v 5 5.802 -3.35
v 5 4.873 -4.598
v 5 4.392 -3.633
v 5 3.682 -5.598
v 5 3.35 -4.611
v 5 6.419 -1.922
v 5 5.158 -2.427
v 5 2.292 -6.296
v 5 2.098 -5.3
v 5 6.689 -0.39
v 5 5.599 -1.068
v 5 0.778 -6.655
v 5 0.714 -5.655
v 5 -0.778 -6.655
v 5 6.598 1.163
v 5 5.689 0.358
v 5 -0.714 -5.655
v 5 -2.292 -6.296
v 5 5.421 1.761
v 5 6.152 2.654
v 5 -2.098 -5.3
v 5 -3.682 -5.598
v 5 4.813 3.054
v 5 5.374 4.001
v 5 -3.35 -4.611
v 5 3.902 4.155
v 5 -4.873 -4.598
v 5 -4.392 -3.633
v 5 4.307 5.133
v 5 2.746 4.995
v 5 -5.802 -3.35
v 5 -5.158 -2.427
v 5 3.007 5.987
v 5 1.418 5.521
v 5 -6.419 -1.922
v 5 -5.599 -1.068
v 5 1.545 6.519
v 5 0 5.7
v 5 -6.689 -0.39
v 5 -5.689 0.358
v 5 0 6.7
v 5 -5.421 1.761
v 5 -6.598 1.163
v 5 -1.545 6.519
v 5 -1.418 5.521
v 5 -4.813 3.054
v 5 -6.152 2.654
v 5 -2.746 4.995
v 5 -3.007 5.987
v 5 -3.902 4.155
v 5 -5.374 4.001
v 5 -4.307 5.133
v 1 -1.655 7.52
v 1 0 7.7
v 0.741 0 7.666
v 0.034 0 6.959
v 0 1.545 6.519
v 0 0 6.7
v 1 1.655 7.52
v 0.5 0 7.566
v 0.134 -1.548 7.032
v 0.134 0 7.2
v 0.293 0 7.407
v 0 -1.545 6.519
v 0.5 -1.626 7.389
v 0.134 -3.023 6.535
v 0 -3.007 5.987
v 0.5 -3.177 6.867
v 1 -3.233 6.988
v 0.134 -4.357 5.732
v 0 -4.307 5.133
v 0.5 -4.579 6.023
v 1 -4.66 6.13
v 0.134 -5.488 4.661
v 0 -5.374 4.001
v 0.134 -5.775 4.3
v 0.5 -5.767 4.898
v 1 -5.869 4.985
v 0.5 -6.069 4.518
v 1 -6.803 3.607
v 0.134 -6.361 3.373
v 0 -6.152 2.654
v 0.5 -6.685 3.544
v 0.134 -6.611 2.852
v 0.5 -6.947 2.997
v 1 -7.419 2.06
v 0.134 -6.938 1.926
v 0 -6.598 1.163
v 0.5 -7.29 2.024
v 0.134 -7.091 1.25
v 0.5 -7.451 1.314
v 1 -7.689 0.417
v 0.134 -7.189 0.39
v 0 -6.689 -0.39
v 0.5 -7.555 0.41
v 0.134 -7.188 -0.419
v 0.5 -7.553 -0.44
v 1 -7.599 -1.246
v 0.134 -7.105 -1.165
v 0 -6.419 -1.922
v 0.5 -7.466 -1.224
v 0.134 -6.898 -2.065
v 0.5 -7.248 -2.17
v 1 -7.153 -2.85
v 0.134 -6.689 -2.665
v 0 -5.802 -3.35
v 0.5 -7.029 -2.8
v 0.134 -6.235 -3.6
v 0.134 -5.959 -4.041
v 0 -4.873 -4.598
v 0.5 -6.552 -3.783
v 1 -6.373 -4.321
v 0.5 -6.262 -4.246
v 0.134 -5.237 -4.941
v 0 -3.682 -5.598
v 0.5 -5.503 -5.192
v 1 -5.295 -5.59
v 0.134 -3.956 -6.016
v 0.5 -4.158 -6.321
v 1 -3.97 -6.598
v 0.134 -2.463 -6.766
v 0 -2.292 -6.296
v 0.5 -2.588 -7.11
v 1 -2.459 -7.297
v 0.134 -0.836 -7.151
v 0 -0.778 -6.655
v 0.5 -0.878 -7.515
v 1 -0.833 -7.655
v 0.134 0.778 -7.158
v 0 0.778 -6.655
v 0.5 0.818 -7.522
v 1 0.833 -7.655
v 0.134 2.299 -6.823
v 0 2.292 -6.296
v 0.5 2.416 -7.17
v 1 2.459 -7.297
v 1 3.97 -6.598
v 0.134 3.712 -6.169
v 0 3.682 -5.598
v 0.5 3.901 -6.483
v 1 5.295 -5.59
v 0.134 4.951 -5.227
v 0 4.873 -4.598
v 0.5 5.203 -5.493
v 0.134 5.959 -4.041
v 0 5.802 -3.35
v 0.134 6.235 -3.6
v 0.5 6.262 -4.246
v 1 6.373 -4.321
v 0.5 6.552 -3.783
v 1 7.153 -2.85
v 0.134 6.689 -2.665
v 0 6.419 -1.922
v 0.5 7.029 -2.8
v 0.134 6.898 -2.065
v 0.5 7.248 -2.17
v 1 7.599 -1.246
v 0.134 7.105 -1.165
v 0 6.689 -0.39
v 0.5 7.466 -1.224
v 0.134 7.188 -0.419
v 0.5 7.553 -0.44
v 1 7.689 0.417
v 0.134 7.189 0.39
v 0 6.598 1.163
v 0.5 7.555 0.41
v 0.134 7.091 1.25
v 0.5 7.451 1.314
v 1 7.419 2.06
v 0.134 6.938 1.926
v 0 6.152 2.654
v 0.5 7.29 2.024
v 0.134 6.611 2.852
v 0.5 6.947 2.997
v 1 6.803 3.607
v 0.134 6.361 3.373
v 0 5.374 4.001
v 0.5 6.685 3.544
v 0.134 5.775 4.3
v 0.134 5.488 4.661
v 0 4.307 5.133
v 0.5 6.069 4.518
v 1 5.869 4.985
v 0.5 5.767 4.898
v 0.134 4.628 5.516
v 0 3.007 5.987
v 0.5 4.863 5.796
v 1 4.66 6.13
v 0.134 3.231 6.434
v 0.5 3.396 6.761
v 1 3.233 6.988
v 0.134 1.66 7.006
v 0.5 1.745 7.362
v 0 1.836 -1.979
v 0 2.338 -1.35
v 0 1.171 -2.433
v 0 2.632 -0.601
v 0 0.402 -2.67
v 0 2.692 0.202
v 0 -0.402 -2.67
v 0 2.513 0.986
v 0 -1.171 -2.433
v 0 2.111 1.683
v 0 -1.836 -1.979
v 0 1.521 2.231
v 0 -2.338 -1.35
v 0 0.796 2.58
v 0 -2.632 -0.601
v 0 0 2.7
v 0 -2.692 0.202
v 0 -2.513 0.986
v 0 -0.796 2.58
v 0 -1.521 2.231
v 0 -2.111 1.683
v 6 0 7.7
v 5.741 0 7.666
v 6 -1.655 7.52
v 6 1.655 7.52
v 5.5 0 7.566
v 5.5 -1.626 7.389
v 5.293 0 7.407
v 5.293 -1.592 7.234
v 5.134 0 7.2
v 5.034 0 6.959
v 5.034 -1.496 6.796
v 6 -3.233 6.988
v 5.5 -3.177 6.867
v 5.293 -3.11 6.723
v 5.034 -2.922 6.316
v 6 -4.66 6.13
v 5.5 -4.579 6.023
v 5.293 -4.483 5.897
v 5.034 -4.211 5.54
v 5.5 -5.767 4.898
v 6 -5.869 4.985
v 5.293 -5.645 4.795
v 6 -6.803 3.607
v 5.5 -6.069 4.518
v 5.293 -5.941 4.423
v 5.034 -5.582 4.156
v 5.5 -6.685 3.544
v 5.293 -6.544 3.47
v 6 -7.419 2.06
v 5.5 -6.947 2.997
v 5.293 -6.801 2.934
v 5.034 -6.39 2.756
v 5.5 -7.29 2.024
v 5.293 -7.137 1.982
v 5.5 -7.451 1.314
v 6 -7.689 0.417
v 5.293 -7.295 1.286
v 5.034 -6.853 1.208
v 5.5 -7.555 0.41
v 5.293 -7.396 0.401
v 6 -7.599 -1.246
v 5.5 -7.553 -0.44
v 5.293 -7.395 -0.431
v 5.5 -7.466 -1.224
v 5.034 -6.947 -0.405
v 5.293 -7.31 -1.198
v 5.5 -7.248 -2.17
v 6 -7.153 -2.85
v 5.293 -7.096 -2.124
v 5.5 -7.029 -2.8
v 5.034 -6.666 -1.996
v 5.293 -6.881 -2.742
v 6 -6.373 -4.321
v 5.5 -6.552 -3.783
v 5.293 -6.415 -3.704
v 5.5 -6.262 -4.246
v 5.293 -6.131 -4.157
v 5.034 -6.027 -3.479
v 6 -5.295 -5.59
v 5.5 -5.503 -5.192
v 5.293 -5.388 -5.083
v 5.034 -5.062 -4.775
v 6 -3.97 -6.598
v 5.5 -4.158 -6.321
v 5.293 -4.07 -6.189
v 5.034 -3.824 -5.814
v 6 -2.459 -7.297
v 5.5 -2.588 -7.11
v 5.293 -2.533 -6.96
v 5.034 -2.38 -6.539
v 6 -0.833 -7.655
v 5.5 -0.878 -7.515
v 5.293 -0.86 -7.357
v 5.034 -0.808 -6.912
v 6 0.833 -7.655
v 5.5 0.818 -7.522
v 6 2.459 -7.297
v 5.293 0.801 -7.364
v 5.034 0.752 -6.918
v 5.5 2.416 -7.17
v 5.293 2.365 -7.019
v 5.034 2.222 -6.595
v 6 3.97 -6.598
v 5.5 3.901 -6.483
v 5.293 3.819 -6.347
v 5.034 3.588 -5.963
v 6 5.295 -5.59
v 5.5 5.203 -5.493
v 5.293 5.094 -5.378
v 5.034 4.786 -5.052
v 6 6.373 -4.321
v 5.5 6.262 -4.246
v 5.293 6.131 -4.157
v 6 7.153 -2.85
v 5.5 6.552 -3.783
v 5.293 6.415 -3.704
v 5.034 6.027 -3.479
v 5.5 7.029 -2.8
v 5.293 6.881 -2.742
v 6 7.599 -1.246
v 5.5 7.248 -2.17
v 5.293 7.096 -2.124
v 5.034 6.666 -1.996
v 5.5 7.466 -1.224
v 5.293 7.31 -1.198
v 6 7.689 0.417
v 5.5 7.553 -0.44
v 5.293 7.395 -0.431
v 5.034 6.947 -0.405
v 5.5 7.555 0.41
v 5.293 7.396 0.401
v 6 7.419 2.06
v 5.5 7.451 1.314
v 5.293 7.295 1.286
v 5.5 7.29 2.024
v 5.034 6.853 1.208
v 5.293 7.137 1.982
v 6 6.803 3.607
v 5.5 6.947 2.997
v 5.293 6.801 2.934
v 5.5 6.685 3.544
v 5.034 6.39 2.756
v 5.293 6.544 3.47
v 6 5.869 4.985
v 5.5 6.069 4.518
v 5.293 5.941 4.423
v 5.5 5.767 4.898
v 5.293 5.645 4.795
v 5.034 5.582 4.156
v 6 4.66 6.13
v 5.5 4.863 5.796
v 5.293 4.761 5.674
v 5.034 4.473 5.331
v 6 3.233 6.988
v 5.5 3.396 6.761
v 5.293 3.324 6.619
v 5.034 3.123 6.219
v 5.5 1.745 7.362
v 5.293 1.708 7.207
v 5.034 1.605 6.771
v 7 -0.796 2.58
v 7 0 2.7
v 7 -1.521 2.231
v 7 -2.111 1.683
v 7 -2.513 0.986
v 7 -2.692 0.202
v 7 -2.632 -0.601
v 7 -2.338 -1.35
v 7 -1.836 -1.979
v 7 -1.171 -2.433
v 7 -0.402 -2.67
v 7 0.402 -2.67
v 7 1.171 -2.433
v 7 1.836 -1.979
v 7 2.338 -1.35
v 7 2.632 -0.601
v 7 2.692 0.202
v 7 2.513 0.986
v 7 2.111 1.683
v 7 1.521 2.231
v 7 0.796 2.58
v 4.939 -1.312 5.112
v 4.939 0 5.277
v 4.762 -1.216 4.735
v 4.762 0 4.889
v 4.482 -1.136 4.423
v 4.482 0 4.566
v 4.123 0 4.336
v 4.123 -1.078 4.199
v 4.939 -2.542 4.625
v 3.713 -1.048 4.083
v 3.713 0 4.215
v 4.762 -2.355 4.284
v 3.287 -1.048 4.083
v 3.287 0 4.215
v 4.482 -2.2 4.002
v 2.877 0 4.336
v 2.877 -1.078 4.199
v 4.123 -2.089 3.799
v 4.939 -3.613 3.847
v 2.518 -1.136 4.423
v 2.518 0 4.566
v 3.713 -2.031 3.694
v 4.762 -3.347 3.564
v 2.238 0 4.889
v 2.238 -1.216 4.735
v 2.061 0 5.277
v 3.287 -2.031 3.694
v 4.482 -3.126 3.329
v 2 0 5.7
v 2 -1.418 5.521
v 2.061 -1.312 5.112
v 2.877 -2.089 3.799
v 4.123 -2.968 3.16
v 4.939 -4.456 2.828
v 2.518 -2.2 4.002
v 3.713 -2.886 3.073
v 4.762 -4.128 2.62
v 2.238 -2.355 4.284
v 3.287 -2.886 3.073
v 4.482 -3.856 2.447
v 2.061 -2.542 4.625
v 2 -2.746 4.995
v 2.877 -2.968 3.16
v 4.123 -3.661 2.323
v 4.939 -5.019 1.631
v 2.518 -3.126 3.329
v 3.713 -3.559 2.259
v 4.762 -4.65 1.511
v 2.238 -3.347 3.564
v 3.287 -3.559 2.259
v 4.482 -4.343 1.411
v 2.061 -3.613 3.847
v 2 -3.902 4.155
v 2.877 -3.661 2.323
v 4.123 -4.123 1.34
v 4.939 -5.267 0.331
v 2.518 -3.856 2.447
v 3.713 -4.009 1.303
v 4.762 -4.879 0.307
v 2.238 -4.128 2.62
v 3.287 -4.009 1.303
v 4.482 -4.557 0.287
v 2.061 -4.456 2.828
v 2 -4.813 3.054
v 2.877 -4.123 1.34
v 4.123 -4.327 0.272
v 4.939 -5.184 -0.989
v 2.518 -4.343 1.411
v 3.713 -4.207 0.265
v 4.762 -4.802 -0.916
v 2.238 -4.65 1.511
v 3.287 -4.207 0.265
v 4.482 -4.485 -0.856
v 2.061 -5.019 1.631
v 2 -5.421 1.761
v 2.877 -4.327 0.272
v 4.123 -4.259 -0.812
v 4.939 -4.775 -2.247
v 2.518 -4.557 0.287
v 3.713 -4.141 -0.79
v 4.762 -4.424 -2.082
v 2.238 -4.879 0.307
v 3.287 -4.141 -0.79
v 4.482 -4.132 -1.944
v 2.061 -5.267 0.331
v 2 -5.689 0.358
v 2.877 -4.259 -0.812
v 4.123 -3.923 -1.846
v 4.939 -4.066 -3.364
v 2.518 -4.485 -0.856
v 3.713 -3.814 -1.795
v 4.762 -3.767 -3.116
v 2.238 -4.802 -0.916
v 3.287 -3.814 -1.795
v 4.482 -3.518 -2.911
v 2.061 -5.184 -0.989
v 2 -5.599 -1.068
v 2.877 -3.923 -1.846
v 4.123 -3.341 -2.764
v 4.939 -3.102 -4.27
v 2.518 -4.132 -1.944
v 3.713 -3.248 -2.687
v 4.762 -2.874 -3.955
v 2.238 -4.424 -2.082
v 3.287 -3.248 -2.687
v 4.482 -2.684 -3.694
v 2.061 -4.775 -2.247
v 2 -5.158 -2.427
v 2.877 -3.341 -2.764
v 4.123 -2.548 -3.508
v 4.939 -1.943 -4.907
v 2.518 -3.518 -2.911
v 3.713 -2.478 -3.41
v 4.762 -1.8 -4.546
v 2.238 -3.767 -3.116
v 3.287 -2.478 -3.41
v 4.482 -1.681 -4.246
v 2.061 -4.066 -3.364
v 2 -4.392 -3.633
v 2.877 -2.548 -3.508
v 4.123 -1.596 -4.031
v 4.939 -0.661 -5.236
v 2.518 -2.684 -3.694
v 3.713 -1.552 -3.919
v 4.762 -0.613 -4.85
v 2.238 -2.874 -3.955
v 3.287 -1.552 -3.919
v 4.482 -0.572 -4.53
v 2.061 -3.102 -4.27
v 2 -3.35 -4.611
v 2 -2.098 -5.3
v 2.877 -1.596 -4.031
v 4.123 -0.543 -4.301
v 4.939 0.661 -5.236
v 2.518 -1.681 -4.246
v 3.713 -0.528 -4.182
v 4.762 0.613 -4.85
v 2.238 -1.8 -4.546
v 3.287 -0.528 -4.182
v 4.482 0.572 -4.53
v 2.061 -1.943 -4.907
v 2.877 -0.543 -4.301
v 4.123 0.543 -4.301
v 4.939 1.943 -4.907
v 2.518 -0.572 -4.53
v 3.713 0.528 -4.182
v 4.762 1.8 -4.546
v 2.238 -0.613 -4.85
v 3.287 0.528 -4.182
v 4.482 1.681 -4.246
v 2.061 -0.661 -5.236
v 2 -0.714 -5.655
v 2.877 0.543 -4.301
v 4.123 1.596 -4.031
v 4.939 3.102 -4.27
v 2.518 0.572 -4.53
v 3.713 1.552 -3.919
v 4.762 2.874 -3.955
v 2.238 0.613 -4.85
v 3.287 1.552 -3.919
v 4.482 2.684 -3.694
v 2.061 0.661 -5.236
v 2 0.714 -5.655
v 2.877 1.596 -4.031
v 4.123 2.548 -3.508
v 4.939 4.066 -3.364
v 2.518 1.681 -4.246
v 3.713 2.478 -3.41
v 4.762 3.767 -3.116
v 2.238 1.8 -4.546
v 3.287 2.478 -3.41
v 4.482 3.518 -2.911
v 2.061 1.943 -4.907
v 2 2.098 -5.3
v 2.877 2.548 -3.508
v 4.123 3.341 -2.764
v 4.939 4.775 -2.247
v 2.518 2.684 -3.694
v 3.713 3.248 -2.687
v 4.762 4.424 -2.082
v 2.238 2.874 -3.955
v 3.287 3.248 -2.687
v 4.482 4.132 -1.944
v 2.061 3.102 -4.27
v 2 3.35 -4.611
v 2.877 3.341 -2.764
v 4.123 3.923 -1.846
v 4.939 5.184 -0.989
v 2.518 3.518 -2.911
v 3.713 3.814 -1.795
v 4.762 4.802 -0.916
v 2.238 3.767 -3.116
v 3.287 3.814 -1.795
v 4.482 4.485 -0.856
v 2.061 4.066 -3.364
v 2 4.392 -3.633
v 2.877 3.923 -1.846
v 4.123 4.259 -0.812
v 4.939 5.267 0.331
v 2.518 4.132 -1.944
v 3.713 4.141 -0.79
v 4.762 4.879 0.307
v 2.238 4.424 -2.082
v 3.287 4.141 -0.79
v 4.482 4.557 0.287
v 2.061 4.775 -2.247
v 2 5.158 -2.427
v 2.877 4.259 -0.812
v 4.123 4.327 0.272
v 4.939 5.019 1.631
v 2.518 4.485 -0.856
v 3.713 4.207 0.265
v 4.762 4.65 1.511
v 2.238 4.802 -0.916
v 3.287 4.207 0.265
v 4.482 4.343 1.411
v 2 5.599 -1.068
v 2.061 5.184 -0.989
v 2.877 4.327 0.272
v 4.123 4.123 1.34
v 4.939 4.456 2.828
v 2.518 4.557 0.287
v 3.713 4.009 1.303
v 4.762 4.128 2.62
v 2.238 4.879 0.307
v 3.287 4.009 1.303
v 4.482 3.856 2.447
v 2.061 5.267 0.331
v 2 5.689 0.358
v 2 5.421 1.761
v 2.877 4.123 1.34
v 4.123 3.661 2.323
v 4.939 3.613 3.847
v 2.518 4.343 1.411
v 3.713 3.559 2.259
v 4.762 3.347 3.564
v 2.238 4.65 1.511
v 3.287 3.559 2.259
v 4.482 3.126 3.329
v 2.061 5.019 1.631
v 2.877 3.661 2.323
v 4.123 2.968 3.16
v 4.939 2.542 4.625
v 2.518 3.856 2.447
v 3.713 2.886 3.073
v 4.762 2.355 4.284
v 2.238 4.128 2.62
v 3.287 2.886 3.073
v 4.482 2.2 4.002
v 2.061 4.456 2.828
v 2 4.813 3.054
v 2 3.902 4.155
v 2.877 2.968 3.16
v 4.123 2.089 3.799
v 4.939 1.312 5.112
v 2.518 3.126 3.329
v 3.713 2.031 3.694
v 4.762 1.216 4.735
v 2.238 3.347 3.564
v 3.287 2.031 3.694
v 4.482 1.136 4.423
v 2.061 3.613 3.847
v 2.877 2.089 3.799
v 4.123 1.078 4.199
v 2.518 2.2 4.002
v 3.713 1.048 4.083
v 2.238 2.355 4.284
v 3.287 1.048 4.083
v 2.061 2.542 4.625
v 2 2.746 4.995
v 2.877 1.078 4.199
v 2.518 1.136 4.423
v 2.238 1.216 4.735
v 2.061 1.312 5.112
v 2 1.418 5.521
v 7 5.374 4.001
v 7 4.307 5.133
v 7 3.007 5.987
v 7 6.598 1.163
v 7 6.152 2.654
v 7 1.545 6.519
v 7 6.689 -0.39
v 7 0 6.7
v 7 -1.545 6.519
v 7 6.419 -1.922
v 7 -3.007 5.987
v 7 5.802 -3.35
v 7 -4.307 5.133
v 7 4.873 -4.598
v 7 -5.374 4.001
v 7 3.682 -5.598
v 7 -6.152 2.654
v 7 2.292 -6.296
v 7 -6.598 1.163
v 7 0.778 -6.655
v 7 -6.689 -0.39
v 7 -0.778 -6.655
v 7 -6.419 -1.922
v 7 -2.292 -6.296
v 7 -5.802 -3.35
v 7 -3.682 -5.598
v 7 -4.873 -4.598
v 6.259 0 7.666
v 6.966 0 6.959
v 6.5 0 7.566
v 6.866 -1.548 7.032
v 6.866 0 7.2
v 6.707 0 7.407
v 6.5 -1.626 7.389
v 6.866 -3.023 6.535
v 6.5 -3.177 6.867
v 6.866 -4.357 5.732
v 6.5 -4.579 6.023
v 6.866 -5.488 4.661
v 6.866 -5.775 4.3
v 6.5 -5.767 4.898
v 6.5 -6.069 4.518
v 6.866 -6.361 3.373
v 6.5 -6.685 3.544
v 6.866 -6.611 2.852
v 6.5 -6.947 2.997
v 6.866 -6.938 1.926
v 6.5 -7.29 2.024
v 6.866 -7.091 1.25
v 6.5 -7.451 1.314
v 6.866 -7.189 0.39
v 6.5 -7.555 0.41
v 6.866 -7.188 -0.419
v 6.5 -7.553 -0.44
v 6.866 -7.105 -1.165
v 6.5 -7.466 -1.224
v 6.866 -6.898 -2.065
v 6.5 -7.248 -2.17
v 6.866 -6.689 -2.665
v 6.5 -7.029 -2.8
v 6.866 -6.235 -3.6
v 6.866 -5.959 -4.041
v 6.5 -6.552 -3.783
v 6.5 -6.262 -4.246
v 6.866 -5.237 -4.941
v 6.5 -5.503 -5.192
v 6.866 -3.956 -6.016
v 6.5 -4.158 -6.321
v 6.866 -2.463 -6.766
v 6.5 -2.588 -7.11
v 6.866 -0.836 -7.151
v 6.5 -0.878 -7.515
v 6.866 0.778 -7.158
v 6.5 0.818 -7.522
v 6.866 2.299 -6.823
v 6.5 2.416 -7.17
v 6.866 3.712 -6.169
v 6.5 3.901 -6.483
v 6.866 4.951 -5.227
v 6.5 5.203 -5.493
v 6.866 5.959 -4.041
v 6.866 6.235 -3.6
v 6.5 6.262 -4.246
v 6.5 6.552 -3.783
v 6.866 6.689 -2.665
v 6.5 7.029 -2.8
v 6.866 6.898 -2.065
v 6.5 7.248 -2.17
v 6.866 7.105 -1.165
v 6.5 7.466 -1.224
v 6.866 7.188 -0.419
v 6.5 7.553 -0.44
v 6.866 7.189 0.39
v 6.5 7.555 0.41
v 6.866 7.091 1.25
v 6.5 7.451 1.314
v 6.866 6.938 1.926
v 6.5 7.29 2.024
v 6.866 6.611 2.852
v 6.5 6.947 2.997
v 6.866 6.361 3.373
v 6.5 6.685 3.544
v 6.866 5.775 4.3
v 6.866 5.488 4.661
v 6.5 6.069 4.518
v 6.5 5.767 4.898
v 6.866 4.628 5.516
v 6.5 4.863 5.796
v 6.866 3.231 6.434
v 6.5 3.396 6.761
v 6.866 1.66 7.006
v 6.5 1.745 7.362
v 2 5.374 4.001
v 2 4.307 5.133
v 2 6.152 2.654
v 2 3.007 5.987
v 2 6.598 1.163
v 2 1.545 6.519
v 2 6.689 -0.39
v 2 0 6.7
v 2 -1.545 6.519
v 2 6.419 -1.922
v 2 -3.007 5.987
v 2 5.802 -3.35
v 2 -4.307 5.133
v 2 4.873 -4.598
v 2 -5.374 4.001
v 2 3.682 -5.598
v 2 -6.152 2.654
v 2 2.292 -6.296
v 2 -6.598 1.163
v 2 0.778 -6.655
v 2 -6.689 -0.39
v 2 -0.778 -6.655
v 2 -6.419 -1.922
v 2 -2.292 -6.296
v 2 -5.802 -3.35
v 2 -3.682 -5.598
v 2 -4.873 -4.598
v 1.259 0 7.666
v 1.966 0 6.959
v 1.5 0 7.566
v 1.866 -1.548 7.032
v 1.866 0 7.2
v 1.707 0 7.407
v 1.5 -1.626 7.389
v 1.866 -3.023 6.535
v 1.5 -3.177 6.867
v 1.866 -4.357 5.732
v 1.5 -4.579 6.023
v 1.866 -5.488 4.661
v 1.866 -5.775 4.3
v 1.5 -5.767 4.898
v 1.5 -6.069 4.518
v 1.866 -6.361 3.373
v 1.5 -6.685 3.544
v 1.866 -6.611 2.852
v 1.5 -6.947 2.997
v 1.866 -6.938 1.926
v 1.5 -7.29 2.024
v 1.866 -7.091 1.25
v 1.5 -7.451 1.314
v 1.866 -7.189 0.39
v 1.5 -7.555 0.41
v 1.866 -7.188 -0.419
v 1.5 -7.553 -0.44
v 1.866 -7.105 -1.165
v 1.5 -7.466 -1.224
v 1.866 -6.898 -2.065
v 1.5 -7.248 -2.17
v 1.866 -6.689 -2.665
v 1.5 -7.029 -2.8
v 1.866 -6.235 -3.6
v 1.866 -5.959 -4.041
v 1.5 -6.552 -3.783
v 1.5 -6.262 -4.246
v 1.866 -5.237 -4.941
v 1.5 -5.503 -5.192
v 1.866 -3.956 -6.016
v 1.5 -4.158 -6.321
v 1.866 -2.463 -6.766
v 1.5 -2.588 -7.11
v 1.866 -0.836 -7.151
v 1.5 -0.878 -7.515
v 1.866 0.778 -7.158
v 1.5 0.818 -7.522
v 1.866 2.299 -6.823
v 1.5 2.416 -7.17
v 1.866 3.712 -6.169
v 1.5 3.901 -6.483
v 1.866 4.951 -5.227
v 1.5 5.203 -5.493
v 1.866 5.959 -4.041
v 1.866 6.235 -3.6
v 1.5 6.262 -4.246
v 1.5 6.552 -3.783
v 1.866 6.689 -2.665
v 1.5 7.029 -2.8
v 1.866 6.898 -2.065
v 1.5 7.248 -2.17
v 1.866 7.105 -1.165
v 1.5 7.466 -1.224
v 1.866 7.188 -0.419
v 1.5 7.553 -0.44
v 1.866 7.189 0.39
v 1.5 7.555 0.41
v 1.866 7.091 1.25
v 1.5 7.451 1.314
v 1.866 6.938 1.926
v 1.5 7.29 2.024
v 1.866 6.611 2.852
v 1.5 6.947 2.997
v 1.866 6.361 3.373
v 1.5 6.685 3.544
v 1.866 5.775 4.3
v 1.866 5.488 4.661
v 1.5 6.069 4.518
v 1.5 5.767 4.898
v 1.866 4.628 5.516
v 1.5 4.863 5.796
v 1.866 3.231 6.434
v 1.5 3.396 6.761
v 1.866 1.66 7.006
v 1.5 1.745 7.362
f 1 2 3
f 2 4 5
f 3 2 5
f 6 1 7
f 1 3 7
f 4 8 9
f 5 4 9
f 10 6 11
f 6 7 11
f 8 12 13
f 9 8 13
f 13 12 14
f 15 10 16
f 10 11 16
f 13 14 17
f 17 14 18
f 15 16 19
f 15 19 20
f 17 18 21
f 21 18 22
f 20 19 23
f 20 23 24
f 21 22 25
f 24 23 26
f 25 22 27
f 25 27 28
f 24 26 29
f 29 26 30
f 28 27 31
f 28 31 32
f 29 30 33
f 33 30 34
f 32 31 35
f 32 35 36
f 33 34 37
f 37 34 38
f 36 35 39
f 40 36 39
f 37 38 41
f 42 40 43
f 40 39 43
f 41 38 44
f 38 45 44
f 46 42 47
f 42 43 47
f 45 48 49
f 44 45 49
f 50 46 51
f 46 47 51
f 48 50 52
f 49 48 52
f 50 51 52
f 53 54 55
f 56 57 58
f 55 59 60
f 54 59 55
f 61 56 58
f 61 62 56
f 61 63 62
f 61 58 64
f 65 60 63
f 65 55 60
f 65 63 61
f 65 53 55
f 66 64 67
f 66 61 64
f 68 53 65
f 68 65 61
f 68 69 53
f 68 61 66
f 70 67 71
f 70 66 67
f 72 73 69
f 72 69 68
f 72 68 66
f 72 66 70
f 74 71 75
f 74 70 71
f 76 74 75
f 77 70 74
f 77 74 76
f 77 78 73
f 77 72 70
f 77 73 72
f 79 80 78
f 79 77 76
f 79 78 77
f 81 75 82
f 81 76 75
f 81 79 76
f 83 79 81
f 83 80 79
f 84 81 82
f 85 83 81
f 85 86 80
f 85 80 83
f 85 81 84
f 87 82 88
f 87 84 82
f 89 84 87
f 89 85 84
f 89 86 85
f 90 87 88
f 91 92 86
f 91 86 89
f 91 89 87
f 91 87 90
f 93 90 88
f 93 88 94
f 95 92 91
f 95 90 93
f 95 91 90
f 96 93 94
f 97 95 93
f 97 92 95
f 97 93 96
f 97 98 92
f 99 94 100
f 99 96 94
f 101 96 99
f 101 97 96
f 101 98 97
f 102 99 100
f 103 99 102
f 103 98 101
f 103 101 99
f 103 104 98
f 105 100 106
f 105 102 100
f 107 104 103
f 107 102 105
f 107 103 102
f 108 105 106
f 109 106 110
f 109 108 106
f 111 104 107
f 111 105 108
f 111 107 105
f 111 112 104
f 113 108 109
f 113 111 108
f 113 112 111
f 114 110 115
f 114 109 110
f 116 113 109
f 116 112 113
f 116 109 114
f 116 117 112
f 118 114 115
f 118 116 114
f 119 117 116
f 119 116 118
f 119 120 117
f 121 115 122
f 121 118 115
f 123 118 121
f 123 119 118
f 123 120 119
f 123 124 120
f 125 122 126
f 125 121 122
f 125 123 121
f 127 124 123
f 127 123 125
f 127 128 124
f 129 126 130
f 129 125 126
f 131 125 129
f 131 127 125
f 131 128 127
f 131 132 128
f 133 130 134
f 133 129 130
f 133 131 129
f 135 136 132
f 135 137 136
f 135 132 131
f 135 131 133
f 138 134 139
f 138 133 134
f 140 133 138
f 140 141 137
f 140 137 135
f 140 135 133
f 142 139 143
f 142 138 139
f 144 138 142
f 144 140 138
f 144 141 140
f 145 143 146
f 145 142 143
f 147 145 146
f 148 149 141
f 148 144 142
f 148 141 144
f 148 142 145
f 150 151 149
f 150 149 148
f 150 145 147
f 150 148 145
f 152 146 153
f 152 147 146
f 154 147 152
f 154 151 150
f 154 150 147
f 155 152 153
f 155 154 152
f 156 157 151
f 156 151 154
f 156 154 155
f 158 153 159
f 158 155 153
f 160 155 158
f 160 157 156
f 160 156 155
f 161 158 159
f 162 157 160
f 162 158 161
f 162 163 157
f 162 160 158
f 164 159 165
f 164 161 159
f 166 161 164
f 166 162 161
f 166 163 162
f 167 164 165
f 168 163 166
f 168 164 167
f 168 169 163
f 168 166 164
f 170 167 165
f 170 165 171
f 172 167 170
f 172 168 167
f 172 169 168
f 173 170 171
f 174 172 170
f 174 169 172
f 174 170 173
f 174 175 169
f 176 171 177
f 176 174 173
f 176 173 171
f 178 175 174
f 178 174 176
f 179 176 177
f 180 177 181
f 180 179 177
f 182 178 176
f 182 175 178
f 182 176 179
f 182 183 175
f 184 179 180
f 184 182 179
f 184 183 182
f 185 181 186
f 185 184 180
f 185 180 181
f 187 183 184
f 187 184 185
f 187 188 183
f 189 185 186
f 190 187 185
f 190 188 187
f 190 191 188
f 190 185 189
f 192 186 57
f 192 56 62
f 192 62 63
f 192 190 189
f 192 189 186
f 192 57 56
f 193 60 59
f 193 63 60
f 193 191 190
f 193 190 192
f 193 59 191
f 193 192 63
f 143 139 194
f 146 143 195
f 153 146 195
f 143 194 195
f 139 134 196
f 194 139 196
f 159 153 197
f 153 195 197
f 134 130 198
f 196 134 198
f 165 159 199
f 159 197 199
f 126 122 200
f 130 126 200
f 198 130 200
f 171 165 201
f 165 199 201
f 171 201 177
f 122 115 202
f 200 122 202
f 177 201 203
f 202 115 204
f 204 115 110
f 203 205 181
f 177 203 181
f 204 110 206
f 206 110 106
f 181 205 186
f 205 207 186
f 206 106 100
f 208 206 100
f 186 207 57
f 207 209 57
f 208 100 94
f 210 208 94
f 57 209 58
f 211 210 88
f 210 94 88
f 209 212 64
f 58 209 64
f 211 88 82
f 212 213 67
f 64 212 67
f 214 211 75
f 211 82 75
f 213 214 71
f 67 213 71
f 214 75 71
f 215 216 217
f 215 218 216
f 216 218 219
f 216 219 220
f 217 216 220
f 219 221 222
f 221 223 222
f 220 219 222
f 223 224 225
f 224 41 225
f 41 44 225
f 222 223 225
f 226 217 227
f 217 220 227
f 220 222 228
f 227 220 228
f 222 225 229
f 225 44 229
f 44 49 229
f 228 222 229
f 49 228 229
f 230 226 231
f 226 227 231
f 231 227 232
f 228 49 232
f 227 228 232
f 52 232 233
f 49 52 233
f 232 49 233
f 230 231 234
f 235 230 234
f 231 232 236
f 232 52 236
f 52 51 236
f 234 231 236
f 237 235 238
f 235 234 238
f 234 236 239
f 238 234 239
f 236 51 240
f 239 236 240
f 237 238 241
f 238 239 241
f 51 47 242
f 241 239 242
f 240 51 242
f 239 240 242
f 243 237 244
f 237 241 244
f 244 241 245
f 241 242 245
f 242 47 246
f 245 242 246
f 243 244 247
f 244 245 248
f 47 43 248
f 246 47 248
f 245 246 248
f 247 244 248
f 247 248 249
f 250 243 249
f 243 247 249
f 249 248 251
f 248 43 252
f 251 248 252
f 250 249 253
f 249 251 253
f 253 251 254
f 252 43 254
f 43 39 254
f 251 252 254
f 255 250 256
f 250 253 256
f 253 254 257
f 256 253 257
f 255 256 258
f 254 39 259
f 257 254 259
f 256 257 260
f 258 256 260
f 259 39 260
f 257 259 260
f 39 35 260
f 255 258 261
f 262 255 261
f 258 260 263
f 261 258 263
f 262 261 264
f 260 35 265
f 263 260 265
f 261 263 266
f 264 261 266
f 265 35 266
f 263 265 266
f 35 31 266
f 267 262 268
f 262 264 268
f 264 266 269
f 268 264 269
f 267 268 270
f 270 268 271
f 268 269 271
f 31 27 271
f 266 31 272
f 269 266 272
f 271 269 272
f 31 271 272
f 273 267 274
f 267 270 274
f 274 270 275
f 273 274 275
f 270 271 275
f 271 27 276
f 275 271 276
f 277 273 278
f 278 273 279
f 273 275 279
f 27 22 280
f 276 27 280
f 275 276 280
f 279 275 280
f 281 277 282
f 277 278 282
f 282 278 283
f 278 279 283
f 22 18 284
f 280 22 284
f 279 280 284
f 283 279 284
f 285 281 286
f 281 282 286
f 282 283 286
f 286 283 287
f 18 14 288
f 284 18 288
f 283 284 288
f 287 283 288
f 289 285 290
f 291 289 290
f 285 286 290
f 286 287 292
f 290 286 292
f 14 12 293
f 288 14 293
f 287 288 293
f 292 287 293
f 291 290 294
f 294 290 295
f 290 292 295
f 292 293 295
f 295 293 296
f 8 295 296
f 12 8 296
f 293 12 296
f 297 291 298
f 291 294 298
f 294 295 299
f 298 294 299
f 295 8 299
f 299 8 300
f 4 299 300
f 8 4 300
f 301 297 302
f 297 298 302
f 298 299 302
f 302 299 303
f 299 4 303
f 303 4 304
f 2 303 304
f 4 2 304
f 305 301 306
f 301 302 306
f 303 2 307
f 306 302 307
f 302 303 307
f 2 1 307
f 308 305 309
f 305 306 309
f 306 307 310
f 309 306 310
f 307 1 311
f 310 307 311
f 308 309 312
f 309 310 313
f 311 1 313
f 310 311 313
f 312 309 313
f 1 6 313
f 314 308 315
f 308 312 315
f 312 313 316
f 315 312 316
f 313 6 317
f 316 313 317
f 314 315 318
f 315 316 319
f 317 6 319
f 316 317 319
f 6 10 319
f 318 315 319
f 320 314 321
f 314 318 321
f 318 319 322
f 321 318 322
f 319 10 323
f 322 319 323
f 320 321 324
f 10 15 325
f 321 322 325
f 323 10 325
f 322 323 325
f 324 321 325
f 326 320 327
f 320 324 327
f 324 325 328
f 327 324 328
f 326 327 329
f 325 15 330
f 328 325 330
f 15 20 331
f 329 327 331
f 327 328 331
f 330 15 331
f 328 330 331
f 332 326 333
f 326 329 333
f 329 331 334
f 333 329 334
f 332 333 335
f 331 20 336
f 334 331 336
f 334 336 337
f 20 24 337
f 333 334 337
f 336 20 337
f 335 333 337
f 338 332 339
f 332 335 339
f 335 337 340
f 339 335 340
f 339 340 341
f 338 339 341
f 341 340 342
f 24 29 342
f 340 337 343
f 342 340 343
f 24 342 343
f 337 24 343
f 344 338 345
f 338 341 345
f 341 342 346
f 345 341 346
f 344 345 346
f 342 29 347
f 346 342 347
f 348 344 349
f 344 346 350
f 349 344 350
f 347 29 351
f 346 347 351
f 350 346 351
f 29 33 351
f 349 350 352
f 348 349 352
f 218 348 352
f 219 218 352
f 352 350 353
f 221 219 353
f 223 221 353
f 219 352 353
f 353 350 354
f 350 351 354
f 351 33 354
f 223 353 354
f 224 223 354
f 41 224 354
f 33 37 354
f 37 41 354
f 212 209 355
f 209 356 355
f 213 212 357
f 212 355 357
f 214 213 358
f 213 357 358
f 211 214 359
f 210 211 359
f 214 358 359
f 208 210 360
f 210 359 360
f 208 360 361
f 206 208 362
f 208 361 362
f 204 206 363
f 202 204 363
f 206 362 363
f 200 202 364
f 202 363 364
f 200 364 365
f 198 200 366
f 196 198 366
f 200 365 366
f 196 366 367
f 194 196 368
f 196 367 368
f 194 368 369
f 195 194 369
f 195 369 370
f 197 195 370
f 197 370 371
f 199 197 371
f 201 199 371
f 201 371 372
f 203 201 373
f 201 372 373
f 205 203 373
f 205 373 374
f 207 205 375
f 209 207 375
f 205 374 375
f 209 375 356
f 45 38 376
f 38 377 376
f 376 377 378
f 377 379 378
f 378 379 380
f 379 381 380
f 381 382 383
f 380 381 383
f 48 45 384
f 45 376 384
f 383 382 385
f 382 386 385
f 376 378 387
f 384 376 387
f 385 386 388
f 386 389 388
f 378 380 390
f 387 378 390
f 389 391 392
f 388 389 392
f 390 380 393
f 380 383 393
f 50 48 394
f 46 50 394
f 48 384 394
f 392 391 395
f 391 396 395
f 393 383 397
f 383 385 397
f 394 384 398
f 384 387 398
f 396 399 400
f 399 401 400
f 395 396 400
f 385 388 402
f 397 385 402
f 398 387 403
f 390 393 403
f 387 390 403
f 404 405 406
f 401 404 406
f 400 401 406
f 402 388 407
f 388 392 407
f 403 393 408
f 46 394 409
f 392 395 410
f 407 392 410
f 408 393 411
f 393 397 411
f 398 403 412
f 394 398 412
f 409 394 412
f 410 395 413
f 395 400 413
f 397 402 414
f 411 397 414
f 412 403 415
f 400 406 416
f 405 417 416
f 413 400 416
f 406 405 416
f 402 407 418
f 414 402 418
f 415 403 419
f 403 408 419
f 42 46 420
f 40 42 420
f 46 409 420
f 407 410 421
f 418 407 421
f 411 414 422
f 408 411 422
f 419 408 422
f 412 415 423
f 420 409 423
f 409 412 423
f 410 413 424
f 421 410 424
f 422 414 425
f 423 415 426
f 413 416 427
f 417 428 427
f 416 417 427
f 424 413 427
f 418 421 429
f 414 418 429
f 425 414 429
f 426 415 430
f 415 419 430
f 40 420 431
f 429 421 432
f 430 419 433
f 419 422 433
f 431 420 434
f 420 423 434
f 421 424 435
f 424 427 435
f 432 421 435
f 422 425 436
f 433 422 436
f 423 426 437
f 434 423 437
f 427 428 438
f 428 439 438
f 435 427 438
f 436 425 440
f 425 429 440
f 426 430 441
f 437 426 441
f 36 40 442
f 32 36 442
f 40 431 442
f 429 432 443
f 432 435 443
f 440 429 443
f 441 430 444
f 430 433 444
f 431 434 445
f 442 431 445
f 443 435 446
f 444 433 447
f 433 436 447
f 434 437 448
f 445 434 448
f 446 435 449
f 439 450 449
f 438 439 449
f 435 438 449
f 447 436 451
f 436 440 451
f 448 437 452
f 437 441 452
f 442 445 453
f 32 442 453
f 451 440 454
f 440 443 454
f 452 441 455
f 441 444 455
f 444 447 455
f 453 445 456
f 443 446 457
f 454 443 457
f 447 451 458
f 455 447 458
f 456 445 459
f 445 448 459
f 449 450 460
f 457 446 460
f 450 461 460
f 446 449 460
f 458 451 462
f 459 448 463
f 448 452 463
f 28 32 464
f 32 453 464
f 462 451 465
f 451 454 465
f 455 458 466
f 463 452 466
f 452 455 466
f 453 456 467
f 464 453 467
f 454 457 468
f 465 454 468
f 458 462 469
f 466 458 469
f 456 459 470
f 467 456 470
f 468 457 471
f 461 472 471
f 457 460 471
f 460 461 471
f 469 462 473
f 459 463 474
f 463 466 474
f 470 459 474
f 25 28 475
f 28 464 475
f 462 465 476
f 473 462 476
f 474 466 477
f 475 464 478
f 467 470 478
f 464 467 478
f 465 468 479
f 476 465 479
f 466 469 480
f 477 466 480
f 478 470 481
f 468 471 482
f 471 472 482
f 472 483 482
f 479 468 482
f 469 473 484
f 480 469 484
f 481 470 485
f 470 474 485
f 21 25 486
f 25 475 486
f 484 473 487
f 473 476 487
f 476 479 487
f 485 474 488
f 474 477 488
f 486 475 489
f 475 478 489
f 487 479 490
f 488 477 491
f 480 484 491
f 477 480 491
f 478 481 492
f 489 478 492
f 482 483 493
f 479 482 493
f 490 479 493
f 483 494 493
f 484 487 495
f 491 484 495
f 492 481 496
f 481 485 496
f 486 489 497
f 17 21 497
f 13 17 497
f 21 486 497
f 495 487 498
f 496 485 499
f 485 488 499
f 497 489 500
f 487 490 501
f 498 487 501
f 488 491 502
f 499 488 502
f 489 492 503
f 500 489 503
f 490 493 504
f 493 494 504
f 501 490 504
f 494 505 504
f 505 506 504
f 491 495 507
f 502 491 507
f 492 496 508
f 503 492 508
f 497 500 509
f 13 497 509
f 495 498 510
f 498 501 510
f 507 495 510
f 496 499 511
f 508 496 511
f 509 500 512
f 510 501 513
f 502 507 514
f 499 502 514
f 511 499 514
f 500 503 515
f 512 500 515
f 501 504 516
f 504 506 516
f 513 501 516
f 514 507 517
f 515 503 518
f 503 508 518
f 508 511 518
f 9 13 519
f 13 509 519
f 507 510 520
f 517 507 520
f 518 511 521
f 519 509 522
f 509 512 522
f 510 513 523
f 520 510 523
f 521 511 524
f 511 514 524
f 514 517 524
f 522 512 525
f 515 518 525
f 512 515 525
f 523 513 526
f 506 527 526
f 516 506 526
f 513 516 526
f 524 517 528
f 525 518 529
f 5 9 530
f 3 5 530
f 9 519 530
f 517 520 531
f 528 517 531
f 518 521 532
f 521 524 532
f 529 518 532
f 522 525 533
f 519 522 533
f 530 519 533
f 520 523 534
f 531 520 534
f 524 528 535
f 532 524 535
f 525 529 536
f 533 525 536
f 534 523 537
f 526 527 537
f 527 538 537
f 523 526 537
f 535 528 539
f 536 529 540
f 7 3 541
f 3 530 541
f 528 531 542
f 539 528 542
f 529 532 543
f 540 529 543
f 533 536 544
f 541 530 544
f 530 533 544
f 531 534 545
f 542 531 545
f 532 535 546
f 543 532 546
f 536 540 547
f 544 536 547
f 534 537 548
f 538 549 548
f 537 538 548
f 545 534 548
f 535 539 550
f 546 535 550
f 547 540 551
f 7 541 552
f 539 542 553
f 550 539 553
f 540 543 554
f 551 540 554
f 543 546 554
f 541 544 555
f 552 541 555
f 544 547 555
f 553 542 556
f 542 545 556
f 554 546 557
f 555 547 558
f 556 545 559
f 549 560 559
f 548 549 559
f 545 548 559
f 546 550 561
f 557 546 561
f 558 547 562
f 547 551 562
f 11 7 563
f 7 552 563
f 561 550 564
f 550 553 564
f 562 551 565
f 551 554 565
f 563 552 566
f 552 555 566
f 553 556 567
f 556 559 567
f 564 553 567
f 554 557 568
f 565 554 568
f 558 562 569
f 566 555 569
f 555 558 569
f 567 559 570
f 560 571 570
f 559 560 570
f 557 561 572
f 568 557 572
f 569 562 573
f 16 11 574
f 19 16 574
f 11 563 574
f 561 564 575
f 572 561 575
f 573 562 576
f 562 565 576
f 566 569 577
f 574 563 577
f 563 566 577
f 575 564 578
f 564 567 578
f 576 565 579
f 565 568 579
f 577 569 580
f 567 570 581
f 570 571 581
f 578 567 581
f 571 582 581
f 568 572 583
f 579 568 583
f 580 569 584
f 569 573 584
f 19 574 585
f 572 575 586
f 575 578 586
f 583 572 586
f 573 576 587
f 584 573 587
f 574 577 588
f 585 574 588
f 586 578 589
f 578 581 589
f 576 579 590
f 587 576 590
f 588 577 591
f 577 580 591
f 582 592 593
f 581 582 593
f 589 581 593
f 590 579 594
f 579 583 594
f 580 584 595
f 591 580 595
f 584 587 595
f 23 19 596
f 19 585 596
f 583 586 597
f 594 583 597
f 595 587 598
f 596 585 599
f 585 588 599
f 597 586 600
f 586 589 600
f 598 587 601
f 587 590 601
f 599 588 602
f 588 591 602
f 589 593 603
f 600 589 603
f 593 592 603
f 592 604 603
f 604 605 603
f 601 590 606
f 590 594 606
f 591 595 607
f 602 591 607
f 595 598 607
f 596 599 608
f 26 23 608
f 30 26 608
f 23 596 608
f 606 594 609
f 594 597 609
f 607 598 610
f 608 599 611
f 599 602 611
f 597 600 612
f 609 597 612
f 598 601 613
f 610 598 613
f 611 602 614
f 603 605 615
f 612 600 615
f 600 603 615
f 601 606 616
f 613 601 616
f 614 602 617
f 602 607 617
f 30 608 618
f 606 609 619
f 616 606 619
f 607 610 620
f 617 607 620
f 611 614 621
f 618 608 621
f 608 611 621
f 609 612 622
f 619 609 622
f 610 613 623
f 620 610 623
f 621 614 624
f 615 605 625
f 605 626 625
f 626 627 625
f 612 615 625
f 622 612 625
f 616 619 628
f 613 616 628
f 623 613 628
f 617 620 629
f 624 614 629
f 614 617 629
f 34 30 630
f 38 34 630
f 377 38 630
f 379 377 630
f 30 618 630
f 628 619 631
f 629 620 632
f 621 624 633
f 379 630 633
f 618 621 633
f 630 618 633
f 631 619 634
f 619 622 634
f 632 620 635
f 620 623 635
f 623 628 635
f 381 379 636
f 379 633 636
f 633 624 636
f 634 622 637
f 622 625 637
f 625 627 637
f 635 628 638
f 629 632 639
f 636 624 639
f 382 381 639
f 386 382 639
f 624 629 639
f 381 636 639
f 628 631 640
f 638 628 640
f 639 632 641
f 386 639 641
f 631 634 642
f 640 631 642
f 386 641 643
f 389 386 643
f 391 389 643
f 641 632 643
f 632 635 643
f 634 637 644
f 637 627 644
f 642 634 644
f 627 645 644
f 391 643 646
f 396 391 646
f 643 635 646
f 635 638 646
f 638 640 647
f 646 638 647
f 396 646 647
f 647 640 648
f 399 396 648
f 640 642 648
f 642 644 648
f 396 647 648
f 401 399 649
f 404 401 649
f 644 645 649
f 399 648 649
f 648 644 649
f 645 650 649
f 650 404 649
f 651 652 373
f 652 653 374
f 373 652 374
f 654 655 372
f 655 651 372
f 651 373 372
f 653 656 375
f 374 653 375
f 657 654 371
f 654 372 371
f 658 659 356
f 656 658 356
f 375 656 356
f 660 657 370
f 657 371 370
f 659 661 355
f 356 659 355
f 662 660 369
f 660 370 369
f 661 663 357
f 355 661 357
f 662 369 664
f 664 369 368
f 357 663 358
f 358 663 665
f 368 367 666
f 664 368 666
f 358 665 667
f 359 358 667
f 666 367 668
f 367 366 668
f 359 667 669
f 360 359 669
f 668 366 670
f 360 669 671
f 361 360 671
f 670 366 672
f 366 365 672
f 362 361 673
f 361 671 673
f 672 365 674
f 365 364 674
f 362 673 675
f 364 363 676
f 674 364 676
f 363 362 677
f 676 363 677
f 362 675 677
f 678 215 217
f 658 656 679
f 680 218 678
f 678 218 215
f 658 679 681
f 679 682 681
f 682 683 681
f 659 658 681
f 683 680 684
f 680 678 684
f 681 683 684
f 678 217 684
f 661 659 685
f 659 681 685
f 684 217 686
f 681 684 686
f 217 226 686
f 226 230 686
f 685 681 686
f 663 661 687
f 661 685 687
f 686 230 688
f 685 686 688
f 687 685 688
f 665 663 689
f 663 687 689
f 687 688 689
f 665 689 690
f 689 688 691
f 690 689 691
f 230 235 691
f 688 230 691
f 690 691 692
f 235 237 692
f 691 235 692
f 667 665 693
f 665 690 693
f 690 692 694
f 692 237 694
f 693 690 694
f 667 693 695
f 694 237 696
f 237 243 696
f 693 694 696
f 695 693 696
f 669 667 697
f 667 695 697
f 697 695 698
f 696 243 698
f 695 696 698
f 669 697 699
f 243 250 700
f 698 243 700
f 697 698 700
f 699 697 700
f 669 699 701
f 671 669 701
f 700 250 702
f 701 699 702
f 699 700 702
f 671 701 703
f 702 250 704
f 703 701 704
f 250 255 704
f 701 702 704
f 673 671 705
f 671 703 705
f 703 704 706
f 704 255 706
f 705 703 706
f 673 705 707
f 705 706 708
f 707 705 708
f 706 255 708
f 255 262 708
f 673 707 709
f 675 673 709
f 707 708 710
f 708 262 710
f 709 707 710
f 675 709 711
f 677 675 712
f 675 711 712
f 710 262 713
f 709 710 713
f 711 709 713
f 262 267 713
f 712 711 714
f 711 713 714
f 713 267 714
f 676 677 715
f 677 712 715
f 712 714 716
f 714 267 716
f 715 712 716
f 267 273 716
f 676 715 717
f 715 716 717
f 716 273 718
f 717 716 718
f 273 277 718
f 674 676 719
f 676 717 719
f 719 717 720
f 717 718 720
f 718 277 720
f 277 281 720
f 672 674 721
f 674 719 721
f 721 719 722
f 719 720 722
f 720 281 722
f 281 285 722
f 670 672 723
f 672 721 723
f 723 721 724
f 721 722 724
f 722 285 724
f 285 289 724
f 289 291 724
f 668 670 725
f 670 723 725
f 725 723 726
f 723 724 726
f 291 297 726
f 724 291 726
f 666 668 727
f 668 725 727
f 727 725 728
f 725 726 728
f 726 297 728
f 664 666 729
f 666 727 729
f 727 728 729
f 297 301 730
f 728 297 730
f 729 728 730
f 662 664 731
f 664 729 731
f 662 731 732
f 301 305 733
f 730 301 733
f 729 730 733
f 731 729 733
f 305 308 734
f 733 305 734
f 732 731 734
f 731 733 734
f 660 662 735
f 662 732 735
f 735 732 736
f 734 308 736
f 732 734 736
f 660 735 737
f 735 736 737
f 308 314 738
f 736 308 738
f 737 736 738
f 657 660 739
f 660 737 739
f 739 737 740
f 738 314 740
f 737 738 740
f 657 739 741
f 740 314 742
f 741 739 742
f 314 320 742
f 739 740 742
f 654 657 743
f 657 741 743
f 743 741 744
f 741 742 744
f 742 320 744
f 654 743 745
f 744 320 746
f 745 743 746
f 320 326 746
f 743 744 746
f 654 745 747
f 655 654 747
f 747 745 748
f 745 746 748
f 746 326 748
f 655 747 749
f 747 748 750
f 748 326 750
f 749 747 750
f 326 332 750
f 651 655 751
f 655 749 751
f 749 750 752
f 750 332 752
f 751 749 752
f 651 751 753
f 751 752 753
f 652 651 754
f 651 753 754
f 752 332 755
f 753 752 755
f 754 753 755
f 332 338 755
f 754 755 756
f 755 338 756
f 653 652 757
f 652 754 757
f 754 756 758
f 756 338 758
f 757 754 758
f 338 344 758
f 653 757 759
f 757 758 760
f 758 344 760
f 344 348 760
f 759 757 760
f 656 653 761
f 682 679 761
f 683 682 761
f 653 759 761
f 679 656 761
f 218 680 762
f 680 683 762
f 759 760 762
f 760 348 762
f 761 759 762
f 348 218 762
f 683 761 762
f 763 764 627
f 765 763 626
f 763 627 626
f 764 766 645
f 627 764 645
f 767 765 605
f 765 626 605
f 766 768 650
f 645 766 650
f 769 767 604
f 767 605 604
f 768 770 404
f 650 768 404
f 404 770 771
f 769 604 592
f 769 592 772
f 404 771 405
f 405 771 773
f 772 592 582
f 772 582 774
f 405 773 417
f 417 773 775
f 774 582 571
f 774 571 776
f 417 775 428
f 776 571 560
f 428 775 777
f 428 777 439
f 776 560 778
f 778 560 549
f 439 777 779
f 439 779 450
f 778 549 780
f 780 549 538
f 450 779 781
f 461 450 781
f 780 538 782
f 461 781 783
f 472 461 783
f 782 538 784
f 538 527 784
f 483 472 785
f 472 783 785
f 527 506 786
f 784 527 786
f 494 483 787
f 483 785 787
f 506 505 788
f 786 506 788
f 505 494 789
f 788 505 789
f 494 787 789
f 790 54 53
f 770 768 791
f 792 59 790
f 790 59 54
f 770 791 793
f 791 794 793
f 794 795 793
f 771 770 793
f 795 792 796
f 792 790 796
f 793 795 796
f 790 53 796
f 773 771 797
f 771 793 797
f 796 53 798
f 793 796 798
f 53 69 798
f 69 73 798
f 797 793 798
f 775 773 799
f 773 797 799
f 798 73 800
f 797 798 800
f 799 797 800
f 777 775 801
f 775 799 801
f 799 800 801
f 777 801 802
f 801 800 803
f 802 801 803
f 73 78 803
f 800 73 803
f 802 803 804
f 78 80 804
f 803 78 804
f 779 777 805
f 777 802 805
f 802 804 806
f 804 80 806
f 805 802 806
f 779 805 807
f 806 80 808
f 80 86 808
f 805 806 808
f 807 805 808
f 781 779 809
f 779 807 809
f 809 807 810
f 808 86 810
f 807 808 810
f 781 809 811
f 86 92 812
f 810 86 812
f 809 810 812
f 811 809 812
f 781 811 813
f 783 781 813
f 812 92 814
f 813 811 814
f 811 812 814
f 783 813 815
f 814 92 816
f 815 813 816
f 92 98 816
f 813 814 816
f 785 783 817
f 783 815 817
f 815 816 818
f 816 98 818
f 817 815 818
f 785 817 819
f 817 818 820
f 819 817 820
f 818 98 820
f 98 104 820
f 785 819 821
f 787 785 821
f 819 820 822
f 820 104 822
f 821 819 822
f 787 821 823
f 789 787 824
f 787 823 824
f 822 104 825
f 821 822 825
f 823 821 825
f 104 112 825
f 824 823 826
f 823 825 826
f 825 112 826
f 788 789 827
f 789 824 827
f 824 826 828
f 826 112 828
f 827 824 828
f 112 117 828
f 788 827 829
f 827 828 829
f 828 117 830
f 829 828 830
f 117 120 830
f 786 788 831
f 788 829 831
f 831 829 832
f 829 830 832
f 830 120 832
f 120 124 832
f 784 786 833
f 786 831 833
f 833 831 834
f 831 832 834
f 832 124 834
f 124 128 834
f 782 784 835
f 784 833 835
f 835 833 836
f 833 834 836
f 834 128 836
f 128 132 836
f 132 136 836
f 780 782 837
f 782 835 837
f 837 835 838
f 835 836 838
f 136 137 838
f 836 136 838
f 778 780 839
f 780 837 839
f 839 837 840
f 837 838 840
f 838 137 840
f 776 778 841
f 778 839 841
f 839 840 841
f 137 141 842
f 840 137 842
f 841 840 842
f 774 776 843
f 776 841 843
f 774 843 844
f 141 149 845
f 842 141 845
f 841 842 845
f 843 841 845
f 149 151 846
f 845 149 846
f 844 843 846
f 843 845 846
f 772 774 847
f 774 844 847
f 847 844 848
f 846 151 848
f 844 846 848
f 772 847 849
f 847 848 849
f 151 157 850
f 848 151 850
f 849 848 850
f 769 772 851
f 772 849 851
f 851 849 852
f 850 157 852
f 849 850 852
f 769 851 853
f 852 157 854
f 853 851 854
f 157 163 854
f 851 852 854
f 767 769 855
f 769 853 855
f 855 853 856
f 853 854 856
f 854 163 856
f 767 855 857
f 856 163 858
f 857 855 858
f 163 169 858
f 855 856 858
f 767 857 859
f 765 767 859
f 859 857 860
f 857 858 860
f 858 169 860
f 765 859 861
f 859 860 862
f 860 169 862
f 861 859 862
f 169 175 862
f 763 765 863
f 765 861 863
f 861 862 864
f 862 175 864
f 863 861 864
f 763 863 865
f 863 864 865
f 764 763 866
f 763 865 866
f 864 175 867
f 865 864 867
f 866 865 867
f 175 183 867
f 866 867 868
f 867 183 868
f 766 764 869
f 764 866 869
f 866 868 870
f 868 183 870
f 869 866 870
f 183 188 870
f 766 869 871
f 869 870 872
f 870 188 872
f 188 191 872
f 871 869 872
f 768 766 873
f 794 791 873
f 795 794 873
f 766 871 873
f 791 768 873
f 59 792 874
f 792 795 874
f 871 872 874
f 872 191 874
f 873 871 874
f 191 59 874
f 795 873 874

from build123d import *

# Parameters (mm, degrees)
F2_R = 0.99999


# Not quite as in the source:
# - a fillet or chamfer is up to 0.001 mm smaller than in the source, because OpenCascade refuses the exact size


with BuildPart() as f1:
    # F0 (on Front) → F1 (revolve)
    with BuildSketch(Plane.XZ):
        with BuildLine():
            Line((0, 7.7), (0, 2.7))
            Line((0, 2.7), (7, 2.7))
            Line((7, 2.7), (7, 7.7))
            Line((7, 7.7), (5, 7.7))
            Line((5, 7.7), (5, 5.7))
            ThreePointArc((5, 5.7), (3.5, 4.2), (2, 5.7))
            Line((2, 5.7), (2, 7.7))
            Line((2, 7.7), (0, 7.7))
        make_face()
    revolve(axis=Axis((3.5, 0, 0), (1, 0, 0)))

    # F2 (radius 1 in the source; OpenCascade refuses exactly that, so slightly less here)
    f2_edges = [f1.edges().sort_by_distance(p)[0] for p in [
        (7, 0, -7.7),
        (5, 0, -7.7),
        (2, 0, -7.7),
        (0, 0, -7.7),
    ]]
    fillet(f2_edges, radius=F2_R)


solid = f1.part
